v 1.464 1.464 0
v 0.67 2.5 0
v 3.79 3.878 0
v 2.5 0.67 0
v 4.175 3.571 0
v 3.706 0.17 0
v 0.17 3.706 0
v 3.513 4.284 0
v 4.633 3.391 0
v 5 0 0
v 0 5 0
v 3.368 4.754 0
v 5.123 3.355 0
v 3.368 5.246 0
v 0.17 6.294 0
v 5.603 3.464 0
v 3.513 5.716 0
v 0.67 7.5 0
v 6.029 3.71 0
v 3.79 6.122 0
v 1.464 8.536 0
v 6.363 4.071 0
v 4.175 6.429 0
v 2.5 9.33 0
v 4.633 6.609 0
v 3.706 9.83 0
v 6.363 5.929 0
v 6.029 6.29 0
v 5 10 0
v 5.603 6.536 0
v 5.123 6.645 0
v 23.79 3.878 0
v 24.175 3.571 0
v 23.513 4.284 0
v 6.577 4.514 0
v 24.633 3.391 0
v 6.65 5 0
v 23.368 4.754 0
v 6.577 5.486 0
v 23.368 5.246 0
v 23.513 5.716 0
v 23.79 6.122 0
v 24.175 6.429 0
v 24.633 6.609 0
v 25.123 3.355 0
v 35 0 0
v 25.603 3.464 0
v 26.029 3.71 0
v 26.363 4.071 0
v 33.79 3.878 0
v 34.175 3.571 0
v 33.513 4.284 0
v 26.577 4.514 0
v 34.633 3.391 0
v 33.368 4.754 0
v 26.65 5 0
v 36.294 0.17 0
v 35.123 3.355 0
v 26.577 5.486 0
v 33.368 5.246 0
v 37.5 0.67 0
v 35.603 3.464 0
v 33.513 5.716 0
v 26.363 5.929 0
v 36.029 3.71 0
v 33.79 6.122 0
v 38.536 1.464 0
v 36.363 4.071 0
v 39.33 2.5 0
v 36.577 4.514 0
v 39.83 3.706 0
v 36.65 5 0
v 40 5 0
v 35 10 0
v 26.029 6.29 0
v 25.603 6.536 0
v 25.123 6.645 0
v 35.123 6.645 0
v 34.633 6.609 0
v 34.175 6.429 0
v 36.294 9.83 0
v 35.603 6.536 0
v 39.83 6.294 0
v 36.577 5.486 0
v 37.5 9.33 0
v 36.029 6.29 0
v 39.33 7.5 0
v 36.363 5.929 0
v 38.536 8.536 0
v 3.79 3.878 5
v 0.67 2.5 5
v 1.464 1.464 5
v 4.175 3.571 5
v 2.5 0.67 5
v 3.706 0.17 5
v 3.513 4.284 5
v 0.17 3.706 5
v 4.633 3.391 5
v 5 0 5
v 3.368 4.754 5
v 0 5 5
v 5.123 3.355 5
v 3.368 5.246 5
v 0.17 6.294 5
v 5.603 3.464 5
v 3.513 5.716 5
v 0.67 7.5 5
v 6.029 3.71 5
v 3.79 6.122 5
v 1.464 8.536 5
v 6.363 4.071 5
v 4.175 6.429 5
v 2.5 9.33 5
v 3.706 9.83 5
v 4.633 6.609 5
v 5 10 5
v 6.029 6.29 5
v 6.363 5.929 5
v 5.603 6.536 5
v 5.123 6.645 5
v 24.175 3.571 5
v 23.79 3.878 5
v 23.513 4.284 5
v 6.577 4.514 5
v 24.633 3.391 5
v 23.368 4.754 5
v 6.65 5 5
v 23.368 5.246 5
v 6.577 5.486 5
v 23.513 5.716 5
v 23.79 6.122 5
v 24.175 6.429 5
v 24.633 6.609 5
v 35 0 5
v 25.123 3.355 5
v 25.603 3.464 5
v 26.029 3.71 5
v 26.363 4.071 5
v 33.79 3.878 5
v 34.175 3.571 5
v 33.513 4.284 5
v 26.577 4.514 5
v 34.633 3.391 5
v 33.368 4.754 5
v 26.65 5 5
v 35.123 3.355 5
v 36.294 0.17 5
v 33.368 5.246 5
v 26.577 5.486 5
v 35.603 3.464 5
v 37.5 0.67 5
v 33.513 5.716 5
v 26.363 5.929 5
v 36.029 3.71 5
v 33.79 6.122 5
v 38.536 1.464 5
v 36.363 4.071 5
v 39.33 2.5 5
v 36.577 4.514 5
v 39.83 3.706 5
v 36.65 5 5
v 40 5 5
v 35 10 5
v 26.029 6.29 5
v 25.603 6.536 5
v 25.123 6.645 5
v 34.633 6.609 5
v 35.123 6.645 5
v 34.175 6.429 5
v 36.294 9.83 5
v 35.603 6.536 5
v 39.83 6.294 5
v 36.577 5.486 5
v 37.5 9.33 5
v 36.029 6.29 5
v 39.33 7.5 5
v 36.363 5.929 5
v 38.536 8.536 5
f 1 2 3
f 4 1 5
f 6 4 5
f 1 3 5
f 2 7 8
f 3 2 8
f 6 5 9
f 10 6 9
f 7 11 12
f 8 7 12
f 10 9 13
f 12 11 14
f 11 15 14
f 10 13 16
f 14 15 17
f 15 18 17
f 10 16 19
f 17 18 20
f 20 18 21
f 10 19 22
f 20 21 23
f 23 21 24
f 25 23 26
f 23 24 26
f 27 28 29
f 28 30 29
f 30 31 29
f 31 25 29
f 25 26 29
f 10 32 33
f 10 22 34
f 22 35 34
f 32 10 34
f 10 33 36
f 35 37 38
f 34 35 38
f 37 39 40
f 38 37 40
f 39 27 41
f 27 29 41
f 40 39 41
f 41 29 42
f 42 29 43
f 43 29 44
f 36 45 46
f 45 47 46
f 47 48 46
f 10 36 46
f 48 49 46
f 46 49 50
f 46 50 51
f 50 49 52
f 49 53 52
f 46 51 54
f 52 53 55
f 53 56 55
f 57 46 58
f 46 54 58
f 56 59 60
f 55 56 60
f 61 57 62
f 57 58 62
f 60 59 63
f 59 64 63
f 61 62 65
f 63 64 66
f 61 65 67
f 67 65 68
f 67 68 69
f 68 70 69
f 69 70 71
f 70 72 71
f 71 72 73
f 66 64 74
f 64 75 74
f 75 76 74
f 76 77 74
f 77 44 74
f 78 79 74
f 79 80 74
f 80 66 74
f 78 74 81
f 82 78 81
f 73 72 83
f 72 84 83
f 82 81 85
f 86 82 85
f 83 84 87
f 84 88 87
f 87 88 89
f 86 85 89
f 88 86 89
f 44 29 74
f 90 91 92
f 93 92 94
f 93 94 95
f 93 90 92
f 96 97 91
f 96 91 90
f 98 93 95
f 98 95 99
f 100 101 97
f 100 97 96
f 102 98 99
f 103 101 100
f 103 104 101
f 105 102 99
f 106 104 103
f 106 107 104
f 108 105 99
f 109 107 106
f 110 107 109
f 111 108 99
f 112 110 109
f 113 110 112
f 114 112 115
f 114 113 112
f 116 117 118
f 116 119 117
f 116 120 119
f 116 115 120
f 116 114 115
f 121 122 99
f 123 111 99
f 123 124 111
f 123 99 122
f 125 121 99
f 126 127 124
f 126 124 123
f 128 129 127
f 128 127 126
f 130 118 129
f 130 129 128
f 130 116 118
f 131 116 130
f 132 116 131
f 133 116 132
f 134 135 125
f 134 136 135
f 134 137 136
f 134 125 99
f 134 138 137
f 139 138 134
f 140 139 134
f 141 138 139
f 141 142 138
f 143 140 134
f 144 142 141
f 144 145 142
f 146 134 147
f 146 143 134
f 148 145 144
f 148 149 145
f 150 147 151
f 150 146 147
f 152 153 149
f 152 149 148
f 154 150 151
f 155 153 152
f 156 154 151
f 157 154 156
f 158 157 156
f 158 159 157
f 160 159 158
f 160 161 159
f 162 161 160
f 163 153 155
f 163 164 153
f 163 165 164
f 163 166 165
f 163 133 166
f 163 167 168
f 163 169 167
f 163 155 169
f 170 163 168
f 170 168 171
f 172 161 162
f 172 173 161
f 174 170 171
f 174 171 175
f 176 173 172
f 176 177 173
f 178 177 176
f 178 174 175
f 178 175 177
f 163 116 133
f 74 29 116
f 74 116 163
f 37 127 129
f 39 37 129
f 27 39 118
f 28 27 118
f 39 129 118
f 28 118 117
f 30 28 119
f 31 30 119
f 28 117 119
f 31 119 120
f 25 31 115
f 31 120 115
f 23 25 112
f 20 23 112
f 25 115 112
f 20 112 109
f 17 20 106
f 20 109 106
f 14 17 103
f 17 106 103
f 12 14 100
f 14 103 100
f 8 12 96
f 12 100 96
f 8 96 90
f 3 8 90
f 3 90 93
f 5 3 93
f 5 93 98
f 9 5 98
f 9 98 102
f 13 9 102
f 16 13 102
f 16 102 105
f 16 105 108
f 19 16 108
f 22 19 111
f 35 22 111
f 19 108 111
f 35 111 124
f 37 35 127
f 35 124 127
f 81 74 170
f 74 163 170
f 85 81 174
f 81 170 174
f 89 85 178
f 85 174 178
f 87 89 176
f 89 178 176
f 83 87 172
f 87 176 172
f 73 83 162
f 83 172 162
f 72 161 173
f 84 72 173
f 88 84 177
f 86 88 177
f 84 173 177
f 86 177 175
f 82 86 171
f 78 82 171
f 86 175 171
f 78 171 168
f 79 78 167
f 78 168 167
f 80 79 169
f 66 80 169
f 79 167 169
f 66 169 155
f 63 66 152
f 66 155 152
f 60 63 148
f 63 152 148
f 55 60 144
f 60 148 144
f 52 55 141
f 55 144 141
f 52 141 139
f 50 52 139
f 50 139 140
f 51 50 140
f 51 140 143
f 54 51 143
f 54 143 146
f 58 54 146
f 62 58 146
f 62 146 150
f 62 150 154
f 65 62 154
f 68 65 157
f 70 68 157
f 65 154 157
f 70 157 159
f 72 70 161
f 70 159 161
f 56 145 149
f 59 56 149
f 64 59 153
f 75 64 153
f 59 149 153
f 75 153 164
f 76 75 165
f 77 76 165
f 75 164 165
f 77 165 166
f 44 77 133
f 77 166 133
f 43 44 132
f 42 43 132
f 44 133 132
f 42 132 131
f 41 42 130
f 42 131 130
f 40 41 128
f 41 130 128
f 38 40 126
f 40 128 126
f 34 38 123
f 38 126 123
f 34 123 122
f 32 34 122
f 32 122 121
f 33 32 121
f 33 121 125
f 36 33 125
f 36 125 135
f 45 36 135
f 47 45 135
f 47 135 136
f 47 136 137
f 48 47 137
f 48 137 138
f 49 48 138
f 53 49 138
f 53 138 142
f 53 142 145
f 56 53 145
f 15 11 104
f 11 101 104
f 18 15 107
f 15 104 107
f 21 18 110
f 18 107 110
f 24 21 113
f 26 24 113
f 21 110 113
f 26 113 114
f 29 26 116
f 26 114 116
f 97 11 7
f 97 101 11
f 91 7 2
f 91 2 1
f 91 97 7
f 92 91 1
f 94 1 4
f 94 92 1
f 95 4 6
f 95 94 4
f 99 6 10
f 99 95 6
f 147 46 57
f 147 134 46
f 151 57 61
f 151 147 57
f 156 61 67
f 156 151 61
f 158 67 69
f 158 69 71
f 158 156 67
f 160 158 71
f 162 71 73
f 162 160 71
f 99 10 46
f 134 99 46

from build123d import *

# Parameters (mm, degrees)
SKICA1_W                 = 40
SKICA1_H                 = 10
P_IDAT_VYSUNUT_M1_DEPTH  = 5
SKICA2_R                 = 1.65
ODEBRAT_VYSUNUT_M1_DEPTH = 5
ZAOBLIT2_R               = 5
SKICA3_R                 = 1.65
ODEBRAT_VYSUNUT_M2_DEPTH = 10


with BuildPart() as part:
    # Skica1 → Přidat vysunutím1 (new body)
    with BuildSketch(Plane.XY):
        with Locations((20, 5)):
            Rectangle(SKICA1_W, SKICA1_H)
    extrude(amount=P_IDAT_VYSUNUT_M1_DEPTH)

    # Skica2 → Odebrat vysunutím1 (cut)
    with BuildSketch(Plane.XY.offset(5)):
        with Locations((5, 5)):
            Circle(SKICA2_R)
        with Locations((35, 5)):
            Circle(SKICA2_R)
    extrude(amount=-ODEBRAT_VYSUNUT_M1_DEPTH, mode=Mode.SUBTRACT)

    # Zaoblit2
    zaoblit2_edges = [part.edges().sort_by_distance(p)[0] for p in [
        (40, 0, 2.5),
        (40, 10, 2.5),
        (0, 0, 2.5),
        (0, 10, 2.5),
    ]]
    fillet(zaoblit2_edges, radius=ZAOBLIT2_R - 0.0001)  # a hair under: the kernel refuses the full size

    # Skica3 → Odebrat vysunutím2 (cut)
    with BuildSketch(Plane.XY.offset(5)):
        with Locations((25, 5)):
            Circle(SKICA3_R)
    extrude(amount=-ODEBRAT_VYSUNUT_M2_DEPTH, mode=Mode.SUBTRACT)


solid = part.part
